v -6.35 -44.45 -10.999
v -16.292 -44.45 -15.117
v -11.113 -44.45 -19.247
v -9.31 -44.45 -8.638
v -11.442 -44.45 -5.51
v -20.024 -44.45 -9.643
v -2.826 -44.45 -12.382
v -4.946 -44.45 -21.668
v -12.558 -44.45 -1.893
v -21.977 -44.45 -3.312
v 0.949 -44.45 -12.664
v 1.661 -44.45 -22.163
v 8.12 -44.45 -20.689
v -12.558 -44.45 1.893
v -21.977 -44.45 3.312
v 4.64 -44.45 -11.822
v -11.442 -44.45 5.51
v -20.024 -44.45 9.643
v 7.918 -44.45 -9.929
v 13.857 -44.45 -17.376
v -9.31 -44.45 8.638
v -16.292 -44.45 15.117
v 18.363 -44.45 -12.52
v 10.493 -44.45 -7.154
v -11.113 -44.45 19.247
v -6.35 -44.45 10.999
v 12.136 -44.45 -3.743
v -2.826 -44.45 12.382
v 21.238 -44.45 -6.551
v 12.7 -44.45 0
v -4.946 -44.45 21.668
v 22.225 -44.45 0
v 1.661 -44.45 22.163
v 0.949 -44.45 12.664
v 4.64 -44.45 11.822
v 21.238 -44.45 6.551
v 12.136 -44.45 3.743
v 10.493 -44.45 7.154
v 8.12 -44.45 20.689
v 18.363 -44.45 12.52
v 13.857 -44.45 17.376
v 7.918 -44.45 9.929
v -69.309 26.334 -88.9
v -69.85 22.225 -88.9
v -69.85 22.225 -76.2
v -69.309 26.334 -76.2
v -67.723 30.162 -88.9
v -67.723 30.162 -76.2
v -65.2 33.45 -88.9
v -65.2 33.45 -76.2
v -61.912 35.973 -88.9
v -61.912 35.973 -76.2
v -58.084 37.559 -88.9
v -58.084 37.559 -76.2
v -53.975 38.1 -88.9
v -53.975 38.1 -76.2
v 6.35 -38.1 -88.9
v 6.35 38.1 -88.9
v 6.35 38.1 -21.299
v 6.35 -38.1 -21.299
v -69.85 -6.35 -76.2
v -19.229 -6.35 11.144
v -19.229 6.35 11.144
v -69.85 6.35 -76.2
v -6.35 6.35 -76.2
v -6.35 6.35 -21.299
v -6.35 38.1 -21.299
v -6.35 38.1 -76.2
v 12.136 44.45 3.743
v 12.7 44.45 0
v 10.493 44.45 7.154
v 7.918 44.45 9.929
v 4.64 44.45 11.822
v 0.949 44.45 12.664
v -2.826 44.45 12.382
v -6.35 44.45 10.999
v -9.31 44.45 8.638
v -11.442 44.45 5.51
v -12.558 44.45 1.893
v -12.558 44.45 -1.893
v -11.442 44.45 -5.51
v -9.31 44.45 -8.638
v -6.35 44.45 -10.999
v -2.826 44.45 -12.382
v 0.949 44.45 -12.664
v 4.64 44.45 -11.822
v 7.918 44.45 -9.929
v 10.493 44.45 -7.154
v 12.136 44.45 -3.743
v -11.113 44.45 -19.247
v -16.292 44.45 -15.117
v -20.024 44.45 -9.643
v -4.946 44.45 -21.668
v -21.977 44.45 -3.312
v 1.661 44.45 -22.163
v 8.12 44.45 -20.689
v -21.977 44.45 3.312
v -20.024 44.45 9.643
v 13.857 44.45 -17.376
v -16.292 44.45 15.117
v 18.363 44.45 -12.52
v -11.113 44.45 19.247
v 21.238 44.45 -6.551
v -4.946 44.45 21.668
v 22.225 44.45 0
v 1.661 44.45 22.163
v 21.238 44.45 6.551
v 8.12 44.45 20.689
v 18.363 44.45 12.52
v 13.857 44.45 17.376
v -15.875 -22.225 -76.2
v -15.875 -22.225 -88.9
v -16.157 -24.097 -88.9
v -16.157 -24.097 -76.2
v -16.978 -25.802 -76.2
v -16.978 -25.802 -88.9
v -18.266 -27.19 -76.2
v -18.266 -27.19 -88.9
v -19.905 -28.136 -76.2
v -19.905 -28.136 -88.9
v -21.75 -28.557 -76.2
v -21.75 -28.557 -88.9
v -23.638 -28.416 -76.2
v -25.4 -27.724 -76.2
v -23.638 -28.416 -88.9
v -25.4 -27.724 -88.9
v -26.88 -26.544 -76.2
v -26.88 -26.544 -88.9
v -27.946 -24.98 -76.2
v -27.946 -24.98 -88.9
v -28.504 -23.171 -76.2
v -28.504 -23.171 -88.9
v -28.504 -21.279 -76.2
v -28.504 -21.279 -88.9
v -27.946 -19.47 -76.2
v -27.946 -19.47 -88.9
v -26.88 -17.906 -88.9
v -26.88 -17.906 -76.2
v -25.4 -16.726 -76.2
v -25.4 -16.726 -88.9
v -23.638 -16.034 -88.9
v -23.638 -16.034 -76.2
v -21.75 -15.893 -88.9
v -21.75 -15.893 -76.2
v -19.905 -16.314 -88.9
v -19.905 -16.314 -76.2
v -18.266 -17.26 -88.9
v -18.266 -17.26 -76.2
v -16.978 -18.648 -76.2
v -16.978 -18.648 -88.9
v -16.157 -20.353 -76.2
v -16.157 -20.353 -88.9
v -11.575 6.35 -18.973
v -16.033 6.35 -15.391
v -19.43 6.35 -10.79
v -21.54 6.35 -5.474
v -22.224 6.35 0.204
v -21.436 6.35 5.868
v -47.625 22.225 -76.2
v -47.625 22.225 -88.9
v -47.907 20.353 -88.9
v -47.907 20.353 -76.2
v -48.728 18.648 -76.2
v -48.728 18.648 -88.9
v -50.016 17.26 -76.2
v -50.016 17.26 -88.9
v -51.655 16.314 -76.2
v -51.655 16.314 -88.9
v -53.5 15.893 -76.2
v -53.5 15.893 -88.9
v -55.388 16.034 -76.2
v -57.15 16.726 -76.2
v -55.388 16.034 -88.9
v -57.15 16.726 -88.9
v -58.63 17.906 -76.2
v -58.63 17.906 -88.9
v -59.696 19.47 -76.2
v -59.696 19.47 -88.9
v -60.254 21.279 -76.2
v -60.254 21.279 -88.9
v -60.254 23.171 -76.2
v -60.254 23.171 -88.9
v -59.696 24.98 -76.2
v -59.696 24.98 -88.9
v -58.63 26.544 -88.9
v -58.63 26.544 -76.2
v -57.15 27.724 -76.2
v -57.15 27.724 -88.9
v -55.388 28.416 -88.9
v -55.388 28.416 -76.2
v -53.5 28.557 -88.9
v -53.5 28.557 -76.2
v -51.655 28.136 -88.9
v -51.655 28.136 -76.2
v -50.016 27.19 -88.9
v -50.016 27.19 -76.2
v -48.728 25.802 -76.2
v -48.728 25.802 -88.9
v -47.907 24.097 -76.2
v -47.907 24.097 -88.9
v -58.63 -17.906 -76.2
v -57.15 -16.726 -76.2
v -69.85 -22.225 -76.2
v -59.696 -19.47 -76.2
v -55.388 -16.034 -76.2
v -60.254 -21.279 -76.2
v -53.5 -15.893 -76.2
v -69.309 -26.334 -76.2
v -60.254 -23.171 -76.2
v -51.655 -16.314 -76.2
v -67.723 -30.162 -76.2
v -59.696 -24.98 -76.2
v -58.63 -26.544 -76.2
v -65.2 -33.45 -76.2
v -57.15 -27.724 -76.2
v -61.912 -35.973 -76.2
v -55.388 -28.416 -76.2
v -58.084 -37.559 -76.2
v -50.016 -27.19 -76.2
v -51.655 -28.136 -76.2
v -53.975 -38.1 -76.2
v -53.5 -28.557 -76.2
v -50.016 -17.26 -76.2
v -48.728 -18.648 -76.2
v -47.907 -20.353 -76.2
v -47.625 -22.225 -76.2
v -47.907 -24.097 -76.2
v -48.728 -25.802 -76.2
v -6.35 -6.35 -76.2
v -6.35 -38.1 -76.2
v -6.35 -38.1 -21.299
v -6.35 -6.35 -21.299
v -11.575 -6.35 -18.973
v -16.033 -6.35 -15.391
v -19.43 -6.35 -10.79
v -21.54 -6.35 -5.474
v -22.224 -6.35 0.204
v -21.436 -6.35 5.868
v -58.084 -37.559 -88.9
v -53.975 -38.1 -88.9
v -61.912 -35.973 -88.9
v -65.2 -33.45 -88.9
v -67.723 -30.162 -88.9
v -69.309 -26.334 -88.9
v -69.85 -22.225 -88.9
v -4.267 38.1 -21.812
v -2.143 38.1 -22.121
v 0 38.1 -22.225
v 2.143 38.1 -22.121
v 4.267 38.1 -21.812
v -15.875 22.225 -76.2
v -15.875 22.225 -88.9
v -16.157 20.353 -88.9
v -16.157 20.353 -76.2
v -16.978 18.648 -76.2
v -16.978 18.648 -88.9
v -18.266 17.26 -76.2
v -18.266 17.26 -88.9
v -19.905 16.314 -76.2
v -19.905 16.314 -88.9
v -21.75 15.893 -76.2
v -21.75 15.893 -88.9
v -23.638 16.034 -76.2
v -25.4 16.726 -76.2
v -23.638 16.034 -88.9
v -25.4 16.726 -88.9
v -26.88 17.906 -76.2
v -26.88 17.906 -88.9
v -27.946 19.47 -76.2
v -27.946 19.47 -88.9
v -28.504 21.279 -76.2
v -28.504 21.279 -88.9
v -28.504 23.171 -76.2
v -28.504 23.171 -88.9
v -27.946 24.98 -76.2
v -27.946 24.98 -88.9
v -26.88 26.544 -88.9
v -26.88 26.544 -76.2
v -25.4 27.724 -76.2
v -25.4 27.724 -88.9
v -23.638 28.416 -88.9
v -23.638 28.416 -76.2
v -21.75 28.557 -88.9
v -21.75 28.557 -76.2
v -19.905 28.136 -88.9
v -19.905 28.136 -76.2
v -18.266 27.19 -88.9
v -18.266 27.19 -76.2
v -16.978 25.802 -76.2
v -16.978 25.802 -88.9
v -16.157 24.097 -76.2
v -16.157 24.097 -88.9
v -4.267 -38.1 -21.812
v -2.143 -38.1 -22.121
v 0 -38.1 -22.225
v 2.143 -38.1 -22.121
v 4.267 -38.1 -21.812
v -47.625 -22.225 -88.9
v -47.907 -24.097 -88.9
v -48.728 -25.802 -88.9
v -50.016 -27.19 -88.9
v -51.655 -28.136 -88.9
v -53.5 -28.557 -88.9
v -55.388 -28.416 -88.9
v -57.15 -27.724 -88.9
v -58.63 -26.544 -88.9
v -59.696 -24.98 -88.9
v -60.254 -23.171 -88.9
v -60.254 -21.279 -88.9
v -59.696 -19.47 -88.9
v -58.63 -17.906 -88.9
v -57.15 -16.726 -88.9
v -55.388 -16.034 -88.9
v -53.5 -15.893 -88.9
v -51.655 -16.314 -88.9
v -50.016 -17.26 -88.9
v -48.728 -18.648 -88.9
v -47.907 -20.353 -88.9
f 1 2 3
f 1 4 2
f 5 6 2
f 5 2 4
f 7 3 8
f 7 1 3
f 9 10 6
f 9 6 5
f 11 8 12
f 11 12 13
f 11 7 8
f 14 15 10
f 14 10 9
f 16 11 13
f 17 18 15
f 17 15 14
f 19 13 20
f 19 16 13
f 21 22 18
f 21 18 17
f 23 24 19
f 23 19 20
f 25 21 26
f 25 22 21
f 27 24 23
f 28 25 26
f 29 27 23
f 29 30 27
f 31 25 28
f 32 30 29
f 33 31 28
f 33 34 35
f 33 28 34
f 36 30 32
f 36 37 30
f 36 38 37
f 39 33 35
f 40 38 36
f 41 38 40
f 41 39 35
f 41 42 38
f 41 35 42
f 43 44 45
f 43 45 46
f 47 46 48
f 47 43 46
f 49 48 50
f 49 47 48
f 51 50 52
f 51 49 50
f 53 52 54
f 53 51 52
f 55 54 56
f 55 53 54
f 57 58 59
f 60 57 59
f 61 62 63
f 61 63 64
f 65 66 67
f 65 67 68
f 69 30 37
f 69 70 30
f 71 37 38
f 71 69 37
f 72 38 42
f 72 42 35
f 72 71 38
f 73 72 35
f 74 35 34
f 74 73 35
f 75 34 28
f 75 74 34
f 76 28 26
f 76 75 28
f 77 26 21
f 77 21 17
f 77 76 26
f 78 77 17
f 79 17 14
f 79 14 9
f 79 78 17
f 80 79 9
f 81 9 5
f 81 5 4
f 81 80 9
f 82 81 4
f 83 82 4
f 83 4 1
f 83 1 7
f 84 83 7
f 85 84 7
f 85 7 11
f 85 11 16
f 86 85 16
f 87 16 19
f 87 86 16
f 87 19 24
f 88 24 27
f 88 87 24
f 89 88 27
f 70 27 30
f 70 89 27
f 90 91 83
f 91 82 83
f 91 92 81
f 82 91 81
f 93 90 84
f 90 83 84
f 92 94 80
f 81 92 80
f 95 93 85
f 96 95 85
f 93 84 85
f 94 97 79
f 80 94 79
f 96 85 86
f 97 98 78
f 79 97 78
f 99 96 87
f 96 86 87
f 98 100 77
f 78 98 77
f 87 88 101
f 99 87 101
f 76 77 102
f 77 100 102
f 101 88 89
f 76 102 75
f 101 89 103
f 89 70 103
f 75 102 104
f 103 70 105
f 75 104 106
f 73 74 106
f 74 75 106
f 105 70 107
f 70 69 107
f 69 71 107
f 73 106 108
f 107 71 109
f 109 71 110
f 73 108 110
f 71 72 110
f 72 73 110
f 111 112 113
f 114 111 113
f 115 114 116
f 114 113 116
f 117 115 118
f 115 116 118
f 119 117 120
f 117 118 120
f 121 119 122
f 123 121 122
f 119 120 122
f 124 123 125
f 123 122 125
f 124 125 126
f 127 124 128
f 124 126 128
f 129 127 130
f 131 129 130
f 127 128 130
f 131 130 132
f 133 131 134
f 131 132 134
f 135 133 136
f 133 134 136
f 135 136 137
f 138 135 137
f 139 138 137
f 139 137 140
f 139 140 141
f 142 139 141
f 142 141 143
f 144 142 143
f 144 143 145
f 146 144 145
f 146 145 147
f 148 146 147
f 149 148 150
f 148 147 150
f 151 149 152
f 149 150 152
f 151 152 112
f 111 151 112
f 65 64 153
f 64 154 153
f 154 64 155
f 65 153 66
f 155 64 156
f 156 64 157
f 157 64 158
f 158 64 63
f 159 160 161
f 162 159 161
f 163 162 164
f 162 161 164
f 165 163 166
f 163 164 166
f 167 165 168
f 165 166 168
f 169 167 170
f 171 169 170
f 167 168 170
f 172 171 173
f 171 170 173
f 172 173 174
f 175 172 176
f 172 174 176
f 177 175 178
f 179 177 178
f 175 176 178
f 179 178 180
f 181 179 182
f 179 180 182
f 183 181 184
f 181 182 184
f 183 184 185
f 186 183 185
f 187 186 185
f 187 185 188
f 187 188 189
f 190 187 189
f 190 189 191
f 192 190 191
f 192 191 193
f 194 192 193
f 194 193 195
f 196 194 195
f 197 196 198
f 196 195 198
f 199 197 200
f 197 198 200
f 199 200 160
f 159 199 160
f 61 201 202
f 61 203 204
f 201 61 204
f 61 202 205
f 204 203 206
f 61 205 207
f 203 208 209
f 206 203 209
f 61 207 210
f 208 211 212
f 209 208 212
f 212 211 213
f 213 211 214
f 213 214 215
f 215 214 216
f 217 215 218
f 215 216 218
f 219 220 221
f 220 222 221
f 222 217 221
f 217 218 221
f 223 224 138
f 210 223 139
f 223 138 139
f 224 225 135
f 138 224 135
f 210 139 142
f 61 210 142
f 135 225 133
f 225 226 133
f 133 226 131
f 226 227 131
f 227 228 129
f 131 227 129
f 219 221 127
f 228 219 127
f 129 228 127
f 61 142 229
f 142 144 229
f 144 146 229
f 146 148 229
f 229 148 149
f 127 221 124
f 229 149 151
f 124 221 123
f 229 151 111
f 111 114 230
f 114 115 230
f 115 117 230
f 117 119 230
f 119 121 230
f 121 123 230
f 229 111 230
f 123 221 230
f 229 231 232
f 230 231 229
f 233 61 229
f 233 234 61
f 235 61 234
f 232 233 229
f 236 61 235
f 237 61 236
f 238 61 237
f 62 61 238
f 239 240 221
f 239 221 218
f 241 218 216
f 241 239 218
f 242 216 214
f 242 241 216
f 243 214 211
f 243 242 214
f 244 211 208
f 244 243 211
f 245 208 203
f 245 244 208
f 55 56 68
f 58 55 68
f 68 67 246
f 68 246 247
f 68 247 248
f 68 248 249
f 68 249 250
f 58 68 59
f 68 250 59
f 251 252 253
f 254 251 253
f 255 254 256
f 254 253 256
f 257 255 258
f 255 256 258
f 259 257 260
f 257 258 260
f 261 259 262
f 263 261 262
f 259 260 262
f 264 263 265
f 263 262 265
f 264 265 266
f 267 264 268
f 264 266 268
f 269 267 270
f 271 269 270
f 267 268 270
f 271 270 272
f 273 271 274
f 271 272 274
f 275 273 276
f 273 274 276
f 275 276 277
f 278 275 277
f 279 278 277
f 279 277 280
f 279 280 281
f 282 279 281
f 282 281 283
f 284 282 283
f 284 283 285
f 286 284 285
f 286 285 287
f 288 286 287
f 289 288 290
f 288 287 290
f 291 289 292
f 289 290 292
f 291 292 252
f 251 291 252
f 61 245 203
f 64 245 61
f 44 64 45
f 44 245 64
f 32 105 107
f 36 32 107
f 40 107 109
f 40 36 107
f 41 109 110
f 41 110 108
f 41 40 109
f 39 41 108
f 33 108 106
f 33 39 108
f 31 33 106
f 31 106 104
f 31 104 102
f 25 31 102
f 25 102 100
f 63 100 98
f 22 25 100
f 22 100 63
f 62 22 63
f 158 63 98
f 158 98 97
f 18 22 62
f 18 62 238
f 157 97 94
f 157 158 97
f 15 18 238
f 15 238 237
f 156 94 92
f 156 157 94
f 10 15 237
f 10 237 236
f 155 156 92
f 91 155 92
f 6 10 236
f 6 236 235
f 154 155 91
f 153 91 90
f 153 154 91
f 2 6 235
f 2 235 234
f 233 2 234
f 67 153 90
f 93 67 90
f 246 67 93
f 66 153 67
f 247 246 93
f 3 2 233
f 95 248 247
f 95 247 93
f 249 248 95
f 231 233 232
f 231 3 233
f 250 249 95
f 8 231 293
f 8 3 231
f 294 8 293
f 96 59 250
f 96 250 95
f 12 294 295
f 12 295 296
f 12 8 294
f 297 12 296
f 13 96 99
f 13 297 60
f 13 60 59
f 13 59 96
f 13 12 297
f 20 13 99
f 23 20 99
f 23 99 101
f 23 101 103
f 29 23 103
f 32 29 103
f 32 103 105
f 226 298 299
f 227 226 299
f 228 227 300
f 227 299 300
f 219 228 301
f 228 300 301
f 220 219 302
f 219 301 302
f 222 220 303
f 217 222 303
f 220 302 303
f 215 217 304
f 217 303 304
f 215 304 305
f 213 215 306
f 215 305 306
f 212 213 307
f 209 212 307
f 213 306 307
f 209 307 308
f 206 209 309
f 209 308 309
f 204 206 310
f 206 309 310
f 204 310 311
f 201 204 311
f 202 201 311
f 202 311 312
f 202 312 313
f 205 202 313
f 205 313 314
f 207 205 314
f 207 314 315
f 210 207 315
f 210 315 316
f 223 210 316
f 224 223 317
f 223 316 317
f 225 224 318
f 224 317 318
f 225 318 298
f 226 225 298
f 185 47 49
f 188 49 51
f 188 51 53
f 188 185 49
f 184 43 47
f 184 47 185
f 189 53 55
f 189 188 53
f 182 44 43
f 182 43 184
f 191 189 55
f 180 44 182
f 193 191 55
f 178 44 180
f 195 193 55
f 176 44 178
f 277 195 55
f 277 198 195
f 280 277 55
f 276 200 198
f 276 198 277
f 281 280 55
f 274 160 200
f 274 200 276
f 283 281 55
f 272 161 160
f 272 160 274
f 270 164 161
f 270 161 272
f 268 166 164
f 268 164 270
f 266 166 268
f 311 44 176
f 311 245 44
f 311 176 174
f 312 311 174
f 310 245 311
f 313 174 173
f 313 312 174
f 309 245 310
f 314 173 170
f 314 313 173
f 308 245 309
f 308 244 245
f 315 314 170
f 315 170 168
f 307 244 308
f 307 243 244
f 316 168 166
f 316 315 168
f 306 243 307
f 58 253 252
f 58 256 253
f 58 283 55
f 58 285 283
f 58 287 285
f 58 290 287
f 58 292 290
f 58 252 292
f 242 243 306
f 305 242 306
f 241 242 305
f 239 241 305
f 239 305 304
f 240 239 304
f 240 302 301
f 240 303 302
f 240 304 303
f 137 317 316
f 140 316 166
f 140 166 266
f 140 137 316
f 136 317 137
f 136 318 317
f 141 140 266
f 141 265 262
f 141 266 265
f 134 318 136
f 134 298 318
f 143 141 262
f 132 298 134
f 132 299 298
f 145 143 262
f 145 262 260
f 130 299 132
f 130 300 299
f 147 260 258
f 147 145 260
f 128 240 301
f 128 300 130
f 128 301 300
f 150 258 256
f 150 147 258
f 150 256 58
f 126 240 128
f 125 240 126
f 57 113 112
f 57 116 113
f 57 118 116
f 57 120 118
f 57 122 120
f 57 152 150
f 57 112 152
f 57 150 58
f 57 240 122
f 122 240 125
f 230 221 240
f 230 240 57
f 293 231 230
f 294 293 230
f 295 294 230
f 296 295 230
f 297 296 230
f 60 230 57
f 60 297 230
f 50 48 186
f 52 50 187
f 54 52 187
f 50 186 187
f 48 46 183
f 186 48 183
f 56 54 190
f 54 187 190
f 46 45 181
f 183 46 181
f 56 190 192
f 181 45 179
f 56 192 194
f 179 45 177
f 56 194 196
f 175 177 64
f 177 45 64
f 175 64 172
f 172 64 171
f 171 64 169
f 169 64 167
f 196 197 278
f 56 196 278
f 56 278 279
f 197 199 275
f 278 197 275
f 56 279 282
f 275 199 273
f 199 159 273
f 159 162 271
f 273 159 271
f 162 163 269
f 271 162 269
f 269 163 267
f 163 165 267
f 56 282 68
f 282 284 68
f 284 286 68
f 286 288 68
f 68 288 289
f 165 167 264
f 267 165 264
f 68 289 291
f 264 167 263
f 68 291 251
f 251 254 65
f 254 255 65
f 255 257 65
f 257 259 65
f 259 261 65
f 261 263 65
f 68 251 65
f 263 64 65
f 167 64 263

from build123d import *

# Parameters (mm, degrees)
F0_R     = 22.225
F0_R_2   = 12.7
F1_DEPTH = 44.45
F3_DEPTH = 38.1
F4_R     = 6.35
F5_DEPTH = 12.7
F7_DEPTH = 6.35


with BuildPart() as f1:
    # F0 (on Front) → F1 (new body, symmetric)
    with BuildSketch(Plane.XZ):
        Circle(F0_R)
        Circle(F0_R_2, mode=Mode.SUBTRACT)
    extrude(amount=F1_DEPTH, both=True)

    # F2 (on Front) → F3 (join, symmetric)
    with BuildSketch(Plane.XZ):
        with BuildLine():
            ThreePointArc((0, -22.225), (-3.208614, -21.992167), (-6.35, -21.298547))
            Line((-6.35, -21.298547), (-6.35, -88.9))
            Line((-6.35, -88.9), (0, -88.9))
            Line((0, -88.9), (0, -22.225))
        make_face()
        with BuildLine():
            ThreePointArc((6.35, -21.298547), (3.208614, -21.992167), (0, -22.225))
            Line((0, -22.225), (0, -88.9))
            Line((0, -88.9), (6.35, -88.9))
            Line((6.35, -88.9), (6.35, -21.298547))
        make_face()
    extrude(amount=F3_DEPTH, both=True)

    # F4 (on face) → F5 (join)
    with BuildSketch(Plane(origin=(0, 0, -88.9), x_dir=(1, 0, 0), z_dir=(0, 0, -1))):
        with BuildLine():
            Line((6.35, -38.1), (6.35, 38.1))
            Line((6.35, 38.1), (-53.975, 38.1))
            ThreePointArc((-53.975, 38.1), (-65.20032, 33.45032), (-69.85, 22.225))
            Line((-69.85, 22.225), (-69.85, -22.225))
            ThreePointArc((-69.85, -22.225), (-65.20032, -33.45032), (-53.975, -38.1))
            Line((-53.975, -38.1), (6.35, -38.1))
        make_face()
        with Locations((-53.975, -22.225)):
            Circle(F4_R, mode=Mode.SUBTRACT)
        with Locations((-22.225, -22.225)):
            Circle(F4_R, mode=Mode.SUBTRACT)
        with Locations((-53.975, 22.225)):
            Circle(F4_R, mode=Mode.SUBTRACT)
        with Locations((-22.225, 22.225)):
            Circle(F4_R, mode=Mode.SUBTRACT)
    extrude(amount=-F5_DEPTH)

    # F6 (on Front) → F7 (join, symmetric)
    with BuildSketch(Plane.XZ):
        with BuildLine():
            ThreePointArc((-6.35, -21.298547), (-20.656868, -8.200269), (-19.229016, 11.144306))
            Line((-19.229016, 11.144306), (-69.85, -76.2))
            Line((-69.85, -76.2), (-53.975, -76.2))
            Line((-53.975, -76.2), (-6.35, -76.2))
            Line((-6.35, -76.2), (-6.35, -21.298547))
        make_face()
    extrude(amount=F7_DEPTH, both=True)


solid = f1.part
